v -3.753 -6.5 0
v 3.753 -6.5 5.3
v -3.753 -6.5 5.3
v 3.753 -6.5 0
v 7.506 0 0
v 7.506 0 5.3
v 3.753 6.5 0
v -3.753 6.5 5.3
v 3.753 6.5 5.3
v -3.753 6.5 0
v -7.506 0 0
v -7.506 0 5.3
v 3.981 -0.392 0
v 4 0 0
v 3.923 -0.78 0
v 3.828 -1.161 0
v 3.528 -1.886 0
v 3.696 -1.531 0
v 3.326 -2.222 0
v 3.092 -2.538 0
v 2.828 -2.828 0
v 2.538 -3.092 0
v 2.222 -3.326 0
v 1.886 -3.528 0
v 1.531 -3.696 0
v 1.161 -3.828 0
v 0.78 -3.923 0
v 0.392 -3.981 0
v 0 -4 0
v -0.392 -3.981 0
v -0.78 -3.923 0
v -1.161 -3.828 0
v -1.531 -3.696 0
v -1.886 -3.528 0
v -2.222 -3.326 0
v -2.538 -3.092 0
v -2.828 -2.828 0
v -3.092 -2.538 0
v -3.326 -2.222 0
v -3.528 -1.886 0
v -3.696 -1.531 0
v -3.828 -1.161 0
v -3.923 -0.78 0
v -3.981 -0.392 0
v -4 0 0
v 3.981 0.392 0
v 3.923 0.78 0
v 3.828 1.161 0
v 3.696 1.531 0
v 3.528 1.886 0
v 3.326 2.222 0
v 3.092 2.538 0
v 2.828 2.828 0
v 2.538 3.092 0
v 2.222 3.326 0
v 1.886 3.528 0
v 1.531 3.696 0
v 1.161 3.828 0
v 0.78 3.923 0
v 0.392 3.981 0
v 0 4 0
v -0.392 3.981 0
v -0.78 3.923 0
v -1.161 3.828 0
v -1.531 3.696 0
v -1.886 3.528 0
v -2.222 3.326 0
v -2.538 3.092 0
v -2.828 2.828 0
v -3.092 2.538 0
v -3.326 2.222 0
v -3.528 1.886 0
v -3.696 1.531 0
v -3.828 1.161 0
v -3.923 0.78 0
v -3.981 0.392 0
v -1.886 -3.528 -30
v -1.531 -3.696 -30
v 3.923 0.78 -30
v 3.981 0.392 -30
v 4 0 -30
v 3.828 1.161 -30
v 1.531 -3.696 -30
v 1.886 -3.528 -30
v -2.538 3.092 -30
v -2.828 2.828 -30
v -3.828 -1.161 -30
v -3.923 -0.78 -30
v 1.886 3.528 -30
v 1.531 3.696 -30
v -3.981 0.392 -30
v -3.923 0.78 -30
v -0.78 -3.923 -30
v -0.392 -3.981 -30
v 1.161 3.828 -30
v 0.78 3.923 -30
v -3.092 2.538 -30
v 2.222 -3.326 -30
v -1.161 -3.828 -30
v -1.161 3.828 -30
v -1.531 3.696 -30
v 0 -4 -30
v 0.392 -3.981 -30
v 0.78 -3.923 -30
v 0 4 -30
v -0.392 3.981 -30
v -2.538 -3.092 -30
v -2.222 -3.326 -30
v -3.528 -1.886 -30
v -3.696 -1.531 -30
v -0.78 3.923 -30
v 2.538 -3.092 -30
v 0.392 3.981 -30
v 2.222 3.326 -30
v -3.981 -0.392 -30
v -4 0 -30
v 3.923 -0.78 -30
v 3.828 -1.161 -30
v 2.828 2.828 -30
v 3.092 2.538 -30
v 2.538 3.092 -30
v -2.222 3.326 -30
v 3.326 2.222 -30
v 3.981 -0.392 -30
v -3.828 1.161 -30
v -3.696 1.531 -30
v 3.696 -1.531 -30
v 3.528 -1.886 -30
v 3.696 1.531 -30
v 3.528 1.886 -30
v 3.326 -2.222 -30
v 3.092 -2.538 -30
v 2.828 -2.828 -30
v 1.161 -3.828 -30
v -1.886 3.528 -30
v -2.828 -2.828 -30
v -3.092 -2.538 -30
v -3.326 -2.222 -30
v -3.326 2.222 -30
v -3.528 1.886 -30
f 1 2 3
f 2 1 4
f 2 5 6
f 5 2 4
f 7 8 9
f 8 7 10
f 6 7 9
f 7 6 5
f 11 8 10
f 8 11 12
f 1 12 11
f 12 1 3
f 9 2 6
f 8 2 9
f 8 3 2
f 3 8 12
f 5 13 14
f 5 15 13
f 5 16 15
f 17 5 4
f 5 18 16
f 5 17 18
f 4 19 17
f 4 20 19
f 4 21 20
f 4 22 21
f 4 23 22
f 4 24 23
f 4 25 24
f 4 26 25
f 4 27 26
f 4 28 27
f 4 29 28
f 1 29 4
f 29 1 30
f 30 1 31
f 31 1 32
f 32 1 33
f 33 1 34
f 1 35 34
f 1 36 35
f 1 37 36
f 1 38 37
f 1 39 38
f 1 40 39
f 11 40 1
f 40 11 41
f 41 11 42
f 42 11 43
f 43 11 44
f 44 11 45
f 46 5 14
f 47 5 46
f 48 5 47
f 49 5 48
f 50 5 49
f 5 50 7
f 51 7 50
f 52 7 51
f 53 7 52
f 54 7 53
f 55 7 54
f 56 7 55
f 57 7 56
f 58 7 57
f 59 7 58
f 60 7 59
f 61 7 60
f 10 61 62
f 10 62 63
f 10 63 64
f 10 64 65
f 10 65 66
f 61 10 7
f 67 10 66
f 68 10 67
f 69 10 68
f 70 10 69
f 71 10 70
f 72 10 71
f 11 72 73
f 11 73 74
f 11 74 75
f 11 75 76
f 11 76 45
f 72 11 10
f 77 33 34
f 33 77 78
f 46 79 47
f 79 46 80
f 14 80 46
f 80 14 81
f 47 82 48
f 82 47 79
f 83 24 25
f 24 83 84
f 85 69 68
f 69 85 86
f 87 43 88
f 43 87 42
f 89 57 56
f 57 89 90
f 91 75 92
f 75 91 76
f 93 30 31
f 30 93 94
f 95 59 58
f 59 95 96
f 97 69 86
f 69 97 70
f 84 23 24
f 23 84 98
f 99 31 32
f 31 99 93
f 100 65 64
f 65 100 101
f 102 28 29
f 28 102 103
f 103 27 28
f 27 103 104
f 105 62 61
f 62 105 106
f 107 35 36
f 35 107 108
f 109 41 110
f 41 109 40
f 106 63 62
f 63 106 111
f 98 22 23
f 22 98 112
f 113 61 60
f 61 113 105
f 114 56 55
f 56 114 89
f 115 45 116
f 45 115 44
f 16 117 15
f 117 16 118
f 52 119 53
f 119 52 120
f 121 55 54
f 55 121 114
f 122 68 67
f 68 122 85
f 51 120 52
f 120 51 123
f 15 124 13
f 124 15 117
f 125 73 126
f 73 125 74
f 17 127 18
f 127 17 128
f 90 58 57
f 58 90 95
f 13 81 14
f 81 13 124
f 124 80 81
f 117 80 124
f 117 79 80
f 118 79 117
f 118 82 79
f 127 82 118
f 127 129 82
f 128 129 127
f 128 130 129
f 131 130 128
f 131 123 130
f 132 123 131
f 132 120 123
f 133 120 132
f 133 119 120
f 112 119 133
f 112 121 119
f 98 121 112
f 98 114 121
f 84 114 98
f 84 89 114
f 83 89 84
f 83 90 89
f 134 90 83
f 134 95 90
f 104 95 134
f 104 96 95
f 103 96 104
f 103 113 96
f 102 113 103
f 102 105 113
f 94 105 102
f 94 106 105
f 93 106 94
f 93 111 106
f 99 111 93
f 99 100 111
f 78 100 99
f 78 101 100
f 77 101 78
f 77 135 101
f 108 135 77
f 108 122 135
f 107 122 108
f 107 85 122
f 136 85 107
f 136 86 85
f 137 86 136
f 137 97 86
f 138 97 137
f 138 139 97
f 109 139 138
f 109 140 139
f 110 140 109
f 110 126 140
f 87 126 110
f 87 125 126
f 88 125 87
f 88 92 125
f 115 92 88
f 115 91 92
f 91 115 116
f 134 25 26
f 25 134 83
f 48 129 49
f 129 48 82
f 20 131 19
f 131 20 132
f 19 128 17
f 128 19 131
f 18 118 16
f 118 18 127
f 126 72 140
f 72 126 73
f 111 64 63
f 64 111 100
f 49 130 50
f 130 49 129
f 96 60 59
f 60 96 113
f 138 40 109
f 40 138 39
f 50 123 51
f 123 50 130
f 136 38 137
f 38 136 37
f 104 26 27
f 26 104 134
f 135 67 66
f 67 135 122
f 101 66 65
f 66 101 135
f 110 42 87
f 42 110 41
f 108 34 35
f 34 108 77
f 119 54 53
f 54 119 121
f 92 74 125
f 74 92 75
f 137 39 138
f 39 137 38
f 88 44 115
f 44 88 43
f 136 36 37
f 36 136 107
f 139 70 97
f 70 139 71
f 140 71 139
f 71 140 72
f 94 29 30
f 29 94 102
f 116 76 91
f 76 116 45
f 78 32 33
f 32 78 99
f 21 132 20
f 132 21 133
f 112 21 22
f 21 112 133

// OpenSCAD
// M8 六角ボルト（ねじ山省略）
// 単位: mm

across_flats = 13;
head_height  = 5.3;
shank_diameter = 8;
shank_length   = 30;

// 六角形の外接円半径: 対辺距離 / √3
head_radius = across_flats / sqrt(3);

union() {
    // 頭部: 底面 z=0、+Z 方向へ配置
    cylinder(
        h = head_height,
        r = head_radius,
        $fn = 6
    );

    // シャンク: z<0 側へ配置
    translate([0, 0, -shank_length])
        cylinder(
            h = shank_length,
            d = shank_diameter,
            $fn = 64
        );
}
